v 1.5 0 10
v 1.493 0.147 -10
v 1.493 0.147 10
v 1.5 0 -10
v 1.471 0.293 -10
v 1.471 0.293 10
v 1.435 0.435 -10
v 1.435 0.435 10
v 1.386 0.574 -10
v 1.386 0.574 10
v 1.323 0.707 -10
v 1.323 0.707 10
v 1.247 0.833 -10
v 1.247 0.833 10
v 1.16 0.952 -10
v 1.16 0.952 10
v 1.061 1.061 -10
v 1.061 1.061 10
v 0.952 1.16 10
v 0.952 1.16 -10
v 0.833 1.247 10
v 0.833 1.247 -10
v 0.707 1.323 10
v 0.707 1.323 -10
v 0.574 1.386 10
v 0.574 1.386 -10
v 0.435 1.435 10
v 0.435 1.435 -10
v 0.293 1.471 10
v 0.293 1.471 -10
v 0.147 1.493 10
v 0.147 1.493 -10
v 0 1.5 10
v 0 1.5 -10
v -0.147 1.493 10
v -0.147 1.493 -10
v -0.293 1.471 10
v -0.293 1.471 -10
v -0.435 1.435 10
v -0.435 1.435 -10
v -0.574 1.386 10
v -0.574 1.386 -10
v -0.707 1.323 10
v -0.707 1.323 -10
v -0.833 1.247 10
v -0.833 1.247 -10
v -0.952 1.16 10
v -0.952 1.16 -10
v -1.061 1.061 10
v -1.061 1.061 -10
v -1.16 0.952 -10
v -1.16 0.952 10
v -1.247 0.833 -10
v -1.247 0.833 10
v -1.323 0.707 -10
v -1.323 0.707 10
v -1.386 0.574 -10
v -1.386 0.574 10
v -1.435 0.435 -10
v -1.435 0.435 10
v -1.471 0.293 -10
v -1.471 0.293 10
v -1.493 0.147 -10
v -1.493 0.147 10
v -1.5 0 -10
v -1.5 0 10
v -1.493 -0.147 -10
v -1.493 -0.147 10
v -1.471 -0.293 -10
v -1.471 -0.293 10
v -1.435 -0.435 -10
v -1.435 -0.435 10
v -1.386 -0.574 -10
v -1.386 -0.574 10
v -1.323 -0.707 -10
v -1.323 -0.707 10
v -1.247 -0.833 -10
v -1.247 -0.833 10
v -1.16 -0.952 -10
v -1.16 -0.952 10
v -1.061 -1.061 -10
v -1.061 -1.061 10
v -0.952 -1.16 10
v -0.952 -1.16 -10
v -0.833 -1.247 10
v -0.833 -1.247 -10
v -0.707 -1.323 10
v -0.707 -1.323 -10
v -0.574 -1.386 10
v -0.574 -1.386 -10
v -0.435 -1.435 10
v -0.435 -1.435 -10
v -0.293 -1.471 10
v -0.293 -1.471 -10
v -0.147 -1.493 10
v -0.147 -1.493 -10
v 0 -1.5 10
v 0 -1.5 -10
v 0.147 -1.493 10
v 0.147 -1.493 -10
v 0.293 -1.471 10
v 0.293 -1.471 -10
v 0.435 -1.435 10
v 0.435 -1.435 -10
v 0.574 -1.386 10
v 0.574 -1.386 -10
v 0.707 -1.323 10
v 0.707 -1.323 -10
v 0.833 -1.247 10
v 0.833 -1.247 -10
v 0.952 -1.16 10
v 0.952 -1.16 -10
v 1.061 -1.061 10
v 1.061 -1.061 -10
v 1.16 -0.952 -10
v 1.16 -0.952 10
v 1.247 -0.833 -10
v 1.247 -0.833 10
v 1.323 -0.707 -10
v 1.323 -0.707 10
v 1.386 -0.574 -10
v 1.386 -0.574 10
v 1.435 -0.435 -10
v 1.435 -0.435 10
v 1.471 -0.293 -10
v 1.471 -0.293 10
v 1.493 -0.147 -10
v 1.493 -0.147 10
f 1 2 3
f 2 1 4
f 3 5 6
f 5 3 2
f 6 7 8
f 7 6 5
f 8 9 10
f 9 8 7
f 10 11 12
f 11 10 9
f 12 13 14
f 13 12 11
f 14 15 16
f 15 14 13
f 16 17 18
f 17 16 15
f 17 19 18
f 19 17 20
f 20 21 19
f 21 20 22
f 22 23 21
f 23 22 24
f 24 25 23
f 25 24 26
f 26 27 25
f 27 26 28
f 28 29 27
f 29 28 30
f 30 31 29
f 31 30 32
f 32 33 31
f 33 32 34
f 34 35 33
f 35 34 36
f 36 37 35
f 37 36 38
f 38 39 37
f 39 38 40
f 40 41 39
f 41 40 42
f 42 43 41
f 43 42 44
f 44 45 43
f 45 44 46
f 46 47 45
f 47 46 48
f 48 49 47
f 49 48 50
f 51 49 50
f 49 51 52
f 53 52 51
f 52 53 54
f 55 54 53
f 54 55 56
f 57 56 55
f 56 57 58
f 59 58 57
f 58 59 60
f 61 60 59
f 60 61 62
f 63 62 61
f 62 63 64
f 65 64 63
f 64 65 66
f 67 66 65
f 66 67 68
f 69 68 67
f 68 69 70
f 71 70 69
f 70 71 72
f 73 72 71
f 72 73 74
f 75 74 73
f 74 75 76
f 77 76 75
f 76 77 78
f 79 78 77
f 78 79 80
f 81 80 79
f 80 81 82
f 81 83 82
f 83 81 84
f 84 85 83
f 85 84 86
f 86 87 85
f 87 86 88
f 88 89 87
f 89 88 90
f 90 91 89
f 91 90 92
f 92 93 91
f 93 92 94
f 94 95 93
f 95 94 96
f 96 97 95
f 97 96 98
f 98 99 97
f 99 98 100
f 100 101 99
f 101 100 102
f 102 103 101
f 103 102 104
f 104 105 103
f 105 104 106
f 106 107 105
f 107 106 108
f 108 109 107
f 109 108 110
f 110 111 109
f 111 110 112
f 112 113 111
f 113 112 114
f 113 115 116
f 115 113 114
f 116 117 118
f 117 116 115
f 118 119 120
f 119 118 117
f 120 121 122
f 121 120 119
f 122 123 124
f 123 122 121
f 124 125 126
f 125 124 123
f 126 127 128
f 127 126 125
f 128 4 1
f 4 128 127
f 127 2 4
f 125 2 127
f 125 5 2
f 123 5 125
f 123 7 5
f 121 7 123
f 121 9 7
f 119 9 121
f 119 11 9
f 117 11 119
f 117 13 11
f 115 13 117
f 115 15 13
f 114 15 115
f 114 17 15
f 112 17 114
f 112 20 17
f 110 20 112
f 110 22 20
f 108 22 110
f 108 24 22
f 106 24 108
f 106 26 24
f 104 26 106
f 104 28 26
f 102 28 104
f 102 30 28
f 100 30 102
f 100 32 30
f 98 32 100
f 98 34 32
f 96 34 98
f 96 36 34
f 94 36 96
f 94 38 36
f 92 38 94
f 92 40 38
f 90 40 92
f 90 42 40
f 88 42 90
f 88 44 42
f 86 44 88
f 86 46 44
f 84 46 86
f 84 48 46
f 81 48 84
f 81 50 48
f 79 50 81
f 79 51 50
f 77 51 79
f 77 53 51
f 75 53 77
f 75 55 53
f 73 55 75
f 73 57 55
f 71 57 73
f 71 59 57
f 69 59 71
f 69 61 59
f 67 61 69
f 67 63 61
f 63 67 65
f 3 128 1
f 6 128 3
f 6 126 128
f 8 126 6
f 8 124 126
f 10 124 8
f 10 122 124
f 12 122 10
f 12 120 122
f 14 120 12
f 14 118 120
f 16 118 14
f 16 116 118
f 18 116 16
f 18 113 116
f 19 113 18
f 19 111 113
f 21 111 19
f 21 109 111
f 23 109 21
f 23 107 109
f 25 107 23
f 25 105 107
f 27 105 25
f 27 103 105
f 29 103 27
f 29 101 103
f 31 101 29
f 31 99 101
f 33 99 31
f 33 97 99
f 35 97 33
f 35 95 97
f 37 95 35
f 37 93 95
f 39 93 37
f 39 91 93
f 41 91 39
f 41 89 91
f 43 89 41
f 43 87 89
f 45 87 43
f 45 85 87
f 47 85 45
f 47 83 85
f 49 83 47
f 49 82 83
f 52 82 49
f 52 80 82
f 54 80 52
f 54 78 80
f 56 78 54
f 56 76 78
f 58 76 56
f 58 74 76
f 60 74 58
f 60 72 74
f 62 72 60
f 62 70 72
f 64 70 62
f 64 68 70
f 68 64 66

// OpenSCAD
$fn=64;

thread_d = 3.0;
length = 20.0;
outer_d = thread_d;

module standoff_pillar(d, h){
    cylinder(d=d, h=h, center=true);
}

standoff_pillar(outer_d, length);
